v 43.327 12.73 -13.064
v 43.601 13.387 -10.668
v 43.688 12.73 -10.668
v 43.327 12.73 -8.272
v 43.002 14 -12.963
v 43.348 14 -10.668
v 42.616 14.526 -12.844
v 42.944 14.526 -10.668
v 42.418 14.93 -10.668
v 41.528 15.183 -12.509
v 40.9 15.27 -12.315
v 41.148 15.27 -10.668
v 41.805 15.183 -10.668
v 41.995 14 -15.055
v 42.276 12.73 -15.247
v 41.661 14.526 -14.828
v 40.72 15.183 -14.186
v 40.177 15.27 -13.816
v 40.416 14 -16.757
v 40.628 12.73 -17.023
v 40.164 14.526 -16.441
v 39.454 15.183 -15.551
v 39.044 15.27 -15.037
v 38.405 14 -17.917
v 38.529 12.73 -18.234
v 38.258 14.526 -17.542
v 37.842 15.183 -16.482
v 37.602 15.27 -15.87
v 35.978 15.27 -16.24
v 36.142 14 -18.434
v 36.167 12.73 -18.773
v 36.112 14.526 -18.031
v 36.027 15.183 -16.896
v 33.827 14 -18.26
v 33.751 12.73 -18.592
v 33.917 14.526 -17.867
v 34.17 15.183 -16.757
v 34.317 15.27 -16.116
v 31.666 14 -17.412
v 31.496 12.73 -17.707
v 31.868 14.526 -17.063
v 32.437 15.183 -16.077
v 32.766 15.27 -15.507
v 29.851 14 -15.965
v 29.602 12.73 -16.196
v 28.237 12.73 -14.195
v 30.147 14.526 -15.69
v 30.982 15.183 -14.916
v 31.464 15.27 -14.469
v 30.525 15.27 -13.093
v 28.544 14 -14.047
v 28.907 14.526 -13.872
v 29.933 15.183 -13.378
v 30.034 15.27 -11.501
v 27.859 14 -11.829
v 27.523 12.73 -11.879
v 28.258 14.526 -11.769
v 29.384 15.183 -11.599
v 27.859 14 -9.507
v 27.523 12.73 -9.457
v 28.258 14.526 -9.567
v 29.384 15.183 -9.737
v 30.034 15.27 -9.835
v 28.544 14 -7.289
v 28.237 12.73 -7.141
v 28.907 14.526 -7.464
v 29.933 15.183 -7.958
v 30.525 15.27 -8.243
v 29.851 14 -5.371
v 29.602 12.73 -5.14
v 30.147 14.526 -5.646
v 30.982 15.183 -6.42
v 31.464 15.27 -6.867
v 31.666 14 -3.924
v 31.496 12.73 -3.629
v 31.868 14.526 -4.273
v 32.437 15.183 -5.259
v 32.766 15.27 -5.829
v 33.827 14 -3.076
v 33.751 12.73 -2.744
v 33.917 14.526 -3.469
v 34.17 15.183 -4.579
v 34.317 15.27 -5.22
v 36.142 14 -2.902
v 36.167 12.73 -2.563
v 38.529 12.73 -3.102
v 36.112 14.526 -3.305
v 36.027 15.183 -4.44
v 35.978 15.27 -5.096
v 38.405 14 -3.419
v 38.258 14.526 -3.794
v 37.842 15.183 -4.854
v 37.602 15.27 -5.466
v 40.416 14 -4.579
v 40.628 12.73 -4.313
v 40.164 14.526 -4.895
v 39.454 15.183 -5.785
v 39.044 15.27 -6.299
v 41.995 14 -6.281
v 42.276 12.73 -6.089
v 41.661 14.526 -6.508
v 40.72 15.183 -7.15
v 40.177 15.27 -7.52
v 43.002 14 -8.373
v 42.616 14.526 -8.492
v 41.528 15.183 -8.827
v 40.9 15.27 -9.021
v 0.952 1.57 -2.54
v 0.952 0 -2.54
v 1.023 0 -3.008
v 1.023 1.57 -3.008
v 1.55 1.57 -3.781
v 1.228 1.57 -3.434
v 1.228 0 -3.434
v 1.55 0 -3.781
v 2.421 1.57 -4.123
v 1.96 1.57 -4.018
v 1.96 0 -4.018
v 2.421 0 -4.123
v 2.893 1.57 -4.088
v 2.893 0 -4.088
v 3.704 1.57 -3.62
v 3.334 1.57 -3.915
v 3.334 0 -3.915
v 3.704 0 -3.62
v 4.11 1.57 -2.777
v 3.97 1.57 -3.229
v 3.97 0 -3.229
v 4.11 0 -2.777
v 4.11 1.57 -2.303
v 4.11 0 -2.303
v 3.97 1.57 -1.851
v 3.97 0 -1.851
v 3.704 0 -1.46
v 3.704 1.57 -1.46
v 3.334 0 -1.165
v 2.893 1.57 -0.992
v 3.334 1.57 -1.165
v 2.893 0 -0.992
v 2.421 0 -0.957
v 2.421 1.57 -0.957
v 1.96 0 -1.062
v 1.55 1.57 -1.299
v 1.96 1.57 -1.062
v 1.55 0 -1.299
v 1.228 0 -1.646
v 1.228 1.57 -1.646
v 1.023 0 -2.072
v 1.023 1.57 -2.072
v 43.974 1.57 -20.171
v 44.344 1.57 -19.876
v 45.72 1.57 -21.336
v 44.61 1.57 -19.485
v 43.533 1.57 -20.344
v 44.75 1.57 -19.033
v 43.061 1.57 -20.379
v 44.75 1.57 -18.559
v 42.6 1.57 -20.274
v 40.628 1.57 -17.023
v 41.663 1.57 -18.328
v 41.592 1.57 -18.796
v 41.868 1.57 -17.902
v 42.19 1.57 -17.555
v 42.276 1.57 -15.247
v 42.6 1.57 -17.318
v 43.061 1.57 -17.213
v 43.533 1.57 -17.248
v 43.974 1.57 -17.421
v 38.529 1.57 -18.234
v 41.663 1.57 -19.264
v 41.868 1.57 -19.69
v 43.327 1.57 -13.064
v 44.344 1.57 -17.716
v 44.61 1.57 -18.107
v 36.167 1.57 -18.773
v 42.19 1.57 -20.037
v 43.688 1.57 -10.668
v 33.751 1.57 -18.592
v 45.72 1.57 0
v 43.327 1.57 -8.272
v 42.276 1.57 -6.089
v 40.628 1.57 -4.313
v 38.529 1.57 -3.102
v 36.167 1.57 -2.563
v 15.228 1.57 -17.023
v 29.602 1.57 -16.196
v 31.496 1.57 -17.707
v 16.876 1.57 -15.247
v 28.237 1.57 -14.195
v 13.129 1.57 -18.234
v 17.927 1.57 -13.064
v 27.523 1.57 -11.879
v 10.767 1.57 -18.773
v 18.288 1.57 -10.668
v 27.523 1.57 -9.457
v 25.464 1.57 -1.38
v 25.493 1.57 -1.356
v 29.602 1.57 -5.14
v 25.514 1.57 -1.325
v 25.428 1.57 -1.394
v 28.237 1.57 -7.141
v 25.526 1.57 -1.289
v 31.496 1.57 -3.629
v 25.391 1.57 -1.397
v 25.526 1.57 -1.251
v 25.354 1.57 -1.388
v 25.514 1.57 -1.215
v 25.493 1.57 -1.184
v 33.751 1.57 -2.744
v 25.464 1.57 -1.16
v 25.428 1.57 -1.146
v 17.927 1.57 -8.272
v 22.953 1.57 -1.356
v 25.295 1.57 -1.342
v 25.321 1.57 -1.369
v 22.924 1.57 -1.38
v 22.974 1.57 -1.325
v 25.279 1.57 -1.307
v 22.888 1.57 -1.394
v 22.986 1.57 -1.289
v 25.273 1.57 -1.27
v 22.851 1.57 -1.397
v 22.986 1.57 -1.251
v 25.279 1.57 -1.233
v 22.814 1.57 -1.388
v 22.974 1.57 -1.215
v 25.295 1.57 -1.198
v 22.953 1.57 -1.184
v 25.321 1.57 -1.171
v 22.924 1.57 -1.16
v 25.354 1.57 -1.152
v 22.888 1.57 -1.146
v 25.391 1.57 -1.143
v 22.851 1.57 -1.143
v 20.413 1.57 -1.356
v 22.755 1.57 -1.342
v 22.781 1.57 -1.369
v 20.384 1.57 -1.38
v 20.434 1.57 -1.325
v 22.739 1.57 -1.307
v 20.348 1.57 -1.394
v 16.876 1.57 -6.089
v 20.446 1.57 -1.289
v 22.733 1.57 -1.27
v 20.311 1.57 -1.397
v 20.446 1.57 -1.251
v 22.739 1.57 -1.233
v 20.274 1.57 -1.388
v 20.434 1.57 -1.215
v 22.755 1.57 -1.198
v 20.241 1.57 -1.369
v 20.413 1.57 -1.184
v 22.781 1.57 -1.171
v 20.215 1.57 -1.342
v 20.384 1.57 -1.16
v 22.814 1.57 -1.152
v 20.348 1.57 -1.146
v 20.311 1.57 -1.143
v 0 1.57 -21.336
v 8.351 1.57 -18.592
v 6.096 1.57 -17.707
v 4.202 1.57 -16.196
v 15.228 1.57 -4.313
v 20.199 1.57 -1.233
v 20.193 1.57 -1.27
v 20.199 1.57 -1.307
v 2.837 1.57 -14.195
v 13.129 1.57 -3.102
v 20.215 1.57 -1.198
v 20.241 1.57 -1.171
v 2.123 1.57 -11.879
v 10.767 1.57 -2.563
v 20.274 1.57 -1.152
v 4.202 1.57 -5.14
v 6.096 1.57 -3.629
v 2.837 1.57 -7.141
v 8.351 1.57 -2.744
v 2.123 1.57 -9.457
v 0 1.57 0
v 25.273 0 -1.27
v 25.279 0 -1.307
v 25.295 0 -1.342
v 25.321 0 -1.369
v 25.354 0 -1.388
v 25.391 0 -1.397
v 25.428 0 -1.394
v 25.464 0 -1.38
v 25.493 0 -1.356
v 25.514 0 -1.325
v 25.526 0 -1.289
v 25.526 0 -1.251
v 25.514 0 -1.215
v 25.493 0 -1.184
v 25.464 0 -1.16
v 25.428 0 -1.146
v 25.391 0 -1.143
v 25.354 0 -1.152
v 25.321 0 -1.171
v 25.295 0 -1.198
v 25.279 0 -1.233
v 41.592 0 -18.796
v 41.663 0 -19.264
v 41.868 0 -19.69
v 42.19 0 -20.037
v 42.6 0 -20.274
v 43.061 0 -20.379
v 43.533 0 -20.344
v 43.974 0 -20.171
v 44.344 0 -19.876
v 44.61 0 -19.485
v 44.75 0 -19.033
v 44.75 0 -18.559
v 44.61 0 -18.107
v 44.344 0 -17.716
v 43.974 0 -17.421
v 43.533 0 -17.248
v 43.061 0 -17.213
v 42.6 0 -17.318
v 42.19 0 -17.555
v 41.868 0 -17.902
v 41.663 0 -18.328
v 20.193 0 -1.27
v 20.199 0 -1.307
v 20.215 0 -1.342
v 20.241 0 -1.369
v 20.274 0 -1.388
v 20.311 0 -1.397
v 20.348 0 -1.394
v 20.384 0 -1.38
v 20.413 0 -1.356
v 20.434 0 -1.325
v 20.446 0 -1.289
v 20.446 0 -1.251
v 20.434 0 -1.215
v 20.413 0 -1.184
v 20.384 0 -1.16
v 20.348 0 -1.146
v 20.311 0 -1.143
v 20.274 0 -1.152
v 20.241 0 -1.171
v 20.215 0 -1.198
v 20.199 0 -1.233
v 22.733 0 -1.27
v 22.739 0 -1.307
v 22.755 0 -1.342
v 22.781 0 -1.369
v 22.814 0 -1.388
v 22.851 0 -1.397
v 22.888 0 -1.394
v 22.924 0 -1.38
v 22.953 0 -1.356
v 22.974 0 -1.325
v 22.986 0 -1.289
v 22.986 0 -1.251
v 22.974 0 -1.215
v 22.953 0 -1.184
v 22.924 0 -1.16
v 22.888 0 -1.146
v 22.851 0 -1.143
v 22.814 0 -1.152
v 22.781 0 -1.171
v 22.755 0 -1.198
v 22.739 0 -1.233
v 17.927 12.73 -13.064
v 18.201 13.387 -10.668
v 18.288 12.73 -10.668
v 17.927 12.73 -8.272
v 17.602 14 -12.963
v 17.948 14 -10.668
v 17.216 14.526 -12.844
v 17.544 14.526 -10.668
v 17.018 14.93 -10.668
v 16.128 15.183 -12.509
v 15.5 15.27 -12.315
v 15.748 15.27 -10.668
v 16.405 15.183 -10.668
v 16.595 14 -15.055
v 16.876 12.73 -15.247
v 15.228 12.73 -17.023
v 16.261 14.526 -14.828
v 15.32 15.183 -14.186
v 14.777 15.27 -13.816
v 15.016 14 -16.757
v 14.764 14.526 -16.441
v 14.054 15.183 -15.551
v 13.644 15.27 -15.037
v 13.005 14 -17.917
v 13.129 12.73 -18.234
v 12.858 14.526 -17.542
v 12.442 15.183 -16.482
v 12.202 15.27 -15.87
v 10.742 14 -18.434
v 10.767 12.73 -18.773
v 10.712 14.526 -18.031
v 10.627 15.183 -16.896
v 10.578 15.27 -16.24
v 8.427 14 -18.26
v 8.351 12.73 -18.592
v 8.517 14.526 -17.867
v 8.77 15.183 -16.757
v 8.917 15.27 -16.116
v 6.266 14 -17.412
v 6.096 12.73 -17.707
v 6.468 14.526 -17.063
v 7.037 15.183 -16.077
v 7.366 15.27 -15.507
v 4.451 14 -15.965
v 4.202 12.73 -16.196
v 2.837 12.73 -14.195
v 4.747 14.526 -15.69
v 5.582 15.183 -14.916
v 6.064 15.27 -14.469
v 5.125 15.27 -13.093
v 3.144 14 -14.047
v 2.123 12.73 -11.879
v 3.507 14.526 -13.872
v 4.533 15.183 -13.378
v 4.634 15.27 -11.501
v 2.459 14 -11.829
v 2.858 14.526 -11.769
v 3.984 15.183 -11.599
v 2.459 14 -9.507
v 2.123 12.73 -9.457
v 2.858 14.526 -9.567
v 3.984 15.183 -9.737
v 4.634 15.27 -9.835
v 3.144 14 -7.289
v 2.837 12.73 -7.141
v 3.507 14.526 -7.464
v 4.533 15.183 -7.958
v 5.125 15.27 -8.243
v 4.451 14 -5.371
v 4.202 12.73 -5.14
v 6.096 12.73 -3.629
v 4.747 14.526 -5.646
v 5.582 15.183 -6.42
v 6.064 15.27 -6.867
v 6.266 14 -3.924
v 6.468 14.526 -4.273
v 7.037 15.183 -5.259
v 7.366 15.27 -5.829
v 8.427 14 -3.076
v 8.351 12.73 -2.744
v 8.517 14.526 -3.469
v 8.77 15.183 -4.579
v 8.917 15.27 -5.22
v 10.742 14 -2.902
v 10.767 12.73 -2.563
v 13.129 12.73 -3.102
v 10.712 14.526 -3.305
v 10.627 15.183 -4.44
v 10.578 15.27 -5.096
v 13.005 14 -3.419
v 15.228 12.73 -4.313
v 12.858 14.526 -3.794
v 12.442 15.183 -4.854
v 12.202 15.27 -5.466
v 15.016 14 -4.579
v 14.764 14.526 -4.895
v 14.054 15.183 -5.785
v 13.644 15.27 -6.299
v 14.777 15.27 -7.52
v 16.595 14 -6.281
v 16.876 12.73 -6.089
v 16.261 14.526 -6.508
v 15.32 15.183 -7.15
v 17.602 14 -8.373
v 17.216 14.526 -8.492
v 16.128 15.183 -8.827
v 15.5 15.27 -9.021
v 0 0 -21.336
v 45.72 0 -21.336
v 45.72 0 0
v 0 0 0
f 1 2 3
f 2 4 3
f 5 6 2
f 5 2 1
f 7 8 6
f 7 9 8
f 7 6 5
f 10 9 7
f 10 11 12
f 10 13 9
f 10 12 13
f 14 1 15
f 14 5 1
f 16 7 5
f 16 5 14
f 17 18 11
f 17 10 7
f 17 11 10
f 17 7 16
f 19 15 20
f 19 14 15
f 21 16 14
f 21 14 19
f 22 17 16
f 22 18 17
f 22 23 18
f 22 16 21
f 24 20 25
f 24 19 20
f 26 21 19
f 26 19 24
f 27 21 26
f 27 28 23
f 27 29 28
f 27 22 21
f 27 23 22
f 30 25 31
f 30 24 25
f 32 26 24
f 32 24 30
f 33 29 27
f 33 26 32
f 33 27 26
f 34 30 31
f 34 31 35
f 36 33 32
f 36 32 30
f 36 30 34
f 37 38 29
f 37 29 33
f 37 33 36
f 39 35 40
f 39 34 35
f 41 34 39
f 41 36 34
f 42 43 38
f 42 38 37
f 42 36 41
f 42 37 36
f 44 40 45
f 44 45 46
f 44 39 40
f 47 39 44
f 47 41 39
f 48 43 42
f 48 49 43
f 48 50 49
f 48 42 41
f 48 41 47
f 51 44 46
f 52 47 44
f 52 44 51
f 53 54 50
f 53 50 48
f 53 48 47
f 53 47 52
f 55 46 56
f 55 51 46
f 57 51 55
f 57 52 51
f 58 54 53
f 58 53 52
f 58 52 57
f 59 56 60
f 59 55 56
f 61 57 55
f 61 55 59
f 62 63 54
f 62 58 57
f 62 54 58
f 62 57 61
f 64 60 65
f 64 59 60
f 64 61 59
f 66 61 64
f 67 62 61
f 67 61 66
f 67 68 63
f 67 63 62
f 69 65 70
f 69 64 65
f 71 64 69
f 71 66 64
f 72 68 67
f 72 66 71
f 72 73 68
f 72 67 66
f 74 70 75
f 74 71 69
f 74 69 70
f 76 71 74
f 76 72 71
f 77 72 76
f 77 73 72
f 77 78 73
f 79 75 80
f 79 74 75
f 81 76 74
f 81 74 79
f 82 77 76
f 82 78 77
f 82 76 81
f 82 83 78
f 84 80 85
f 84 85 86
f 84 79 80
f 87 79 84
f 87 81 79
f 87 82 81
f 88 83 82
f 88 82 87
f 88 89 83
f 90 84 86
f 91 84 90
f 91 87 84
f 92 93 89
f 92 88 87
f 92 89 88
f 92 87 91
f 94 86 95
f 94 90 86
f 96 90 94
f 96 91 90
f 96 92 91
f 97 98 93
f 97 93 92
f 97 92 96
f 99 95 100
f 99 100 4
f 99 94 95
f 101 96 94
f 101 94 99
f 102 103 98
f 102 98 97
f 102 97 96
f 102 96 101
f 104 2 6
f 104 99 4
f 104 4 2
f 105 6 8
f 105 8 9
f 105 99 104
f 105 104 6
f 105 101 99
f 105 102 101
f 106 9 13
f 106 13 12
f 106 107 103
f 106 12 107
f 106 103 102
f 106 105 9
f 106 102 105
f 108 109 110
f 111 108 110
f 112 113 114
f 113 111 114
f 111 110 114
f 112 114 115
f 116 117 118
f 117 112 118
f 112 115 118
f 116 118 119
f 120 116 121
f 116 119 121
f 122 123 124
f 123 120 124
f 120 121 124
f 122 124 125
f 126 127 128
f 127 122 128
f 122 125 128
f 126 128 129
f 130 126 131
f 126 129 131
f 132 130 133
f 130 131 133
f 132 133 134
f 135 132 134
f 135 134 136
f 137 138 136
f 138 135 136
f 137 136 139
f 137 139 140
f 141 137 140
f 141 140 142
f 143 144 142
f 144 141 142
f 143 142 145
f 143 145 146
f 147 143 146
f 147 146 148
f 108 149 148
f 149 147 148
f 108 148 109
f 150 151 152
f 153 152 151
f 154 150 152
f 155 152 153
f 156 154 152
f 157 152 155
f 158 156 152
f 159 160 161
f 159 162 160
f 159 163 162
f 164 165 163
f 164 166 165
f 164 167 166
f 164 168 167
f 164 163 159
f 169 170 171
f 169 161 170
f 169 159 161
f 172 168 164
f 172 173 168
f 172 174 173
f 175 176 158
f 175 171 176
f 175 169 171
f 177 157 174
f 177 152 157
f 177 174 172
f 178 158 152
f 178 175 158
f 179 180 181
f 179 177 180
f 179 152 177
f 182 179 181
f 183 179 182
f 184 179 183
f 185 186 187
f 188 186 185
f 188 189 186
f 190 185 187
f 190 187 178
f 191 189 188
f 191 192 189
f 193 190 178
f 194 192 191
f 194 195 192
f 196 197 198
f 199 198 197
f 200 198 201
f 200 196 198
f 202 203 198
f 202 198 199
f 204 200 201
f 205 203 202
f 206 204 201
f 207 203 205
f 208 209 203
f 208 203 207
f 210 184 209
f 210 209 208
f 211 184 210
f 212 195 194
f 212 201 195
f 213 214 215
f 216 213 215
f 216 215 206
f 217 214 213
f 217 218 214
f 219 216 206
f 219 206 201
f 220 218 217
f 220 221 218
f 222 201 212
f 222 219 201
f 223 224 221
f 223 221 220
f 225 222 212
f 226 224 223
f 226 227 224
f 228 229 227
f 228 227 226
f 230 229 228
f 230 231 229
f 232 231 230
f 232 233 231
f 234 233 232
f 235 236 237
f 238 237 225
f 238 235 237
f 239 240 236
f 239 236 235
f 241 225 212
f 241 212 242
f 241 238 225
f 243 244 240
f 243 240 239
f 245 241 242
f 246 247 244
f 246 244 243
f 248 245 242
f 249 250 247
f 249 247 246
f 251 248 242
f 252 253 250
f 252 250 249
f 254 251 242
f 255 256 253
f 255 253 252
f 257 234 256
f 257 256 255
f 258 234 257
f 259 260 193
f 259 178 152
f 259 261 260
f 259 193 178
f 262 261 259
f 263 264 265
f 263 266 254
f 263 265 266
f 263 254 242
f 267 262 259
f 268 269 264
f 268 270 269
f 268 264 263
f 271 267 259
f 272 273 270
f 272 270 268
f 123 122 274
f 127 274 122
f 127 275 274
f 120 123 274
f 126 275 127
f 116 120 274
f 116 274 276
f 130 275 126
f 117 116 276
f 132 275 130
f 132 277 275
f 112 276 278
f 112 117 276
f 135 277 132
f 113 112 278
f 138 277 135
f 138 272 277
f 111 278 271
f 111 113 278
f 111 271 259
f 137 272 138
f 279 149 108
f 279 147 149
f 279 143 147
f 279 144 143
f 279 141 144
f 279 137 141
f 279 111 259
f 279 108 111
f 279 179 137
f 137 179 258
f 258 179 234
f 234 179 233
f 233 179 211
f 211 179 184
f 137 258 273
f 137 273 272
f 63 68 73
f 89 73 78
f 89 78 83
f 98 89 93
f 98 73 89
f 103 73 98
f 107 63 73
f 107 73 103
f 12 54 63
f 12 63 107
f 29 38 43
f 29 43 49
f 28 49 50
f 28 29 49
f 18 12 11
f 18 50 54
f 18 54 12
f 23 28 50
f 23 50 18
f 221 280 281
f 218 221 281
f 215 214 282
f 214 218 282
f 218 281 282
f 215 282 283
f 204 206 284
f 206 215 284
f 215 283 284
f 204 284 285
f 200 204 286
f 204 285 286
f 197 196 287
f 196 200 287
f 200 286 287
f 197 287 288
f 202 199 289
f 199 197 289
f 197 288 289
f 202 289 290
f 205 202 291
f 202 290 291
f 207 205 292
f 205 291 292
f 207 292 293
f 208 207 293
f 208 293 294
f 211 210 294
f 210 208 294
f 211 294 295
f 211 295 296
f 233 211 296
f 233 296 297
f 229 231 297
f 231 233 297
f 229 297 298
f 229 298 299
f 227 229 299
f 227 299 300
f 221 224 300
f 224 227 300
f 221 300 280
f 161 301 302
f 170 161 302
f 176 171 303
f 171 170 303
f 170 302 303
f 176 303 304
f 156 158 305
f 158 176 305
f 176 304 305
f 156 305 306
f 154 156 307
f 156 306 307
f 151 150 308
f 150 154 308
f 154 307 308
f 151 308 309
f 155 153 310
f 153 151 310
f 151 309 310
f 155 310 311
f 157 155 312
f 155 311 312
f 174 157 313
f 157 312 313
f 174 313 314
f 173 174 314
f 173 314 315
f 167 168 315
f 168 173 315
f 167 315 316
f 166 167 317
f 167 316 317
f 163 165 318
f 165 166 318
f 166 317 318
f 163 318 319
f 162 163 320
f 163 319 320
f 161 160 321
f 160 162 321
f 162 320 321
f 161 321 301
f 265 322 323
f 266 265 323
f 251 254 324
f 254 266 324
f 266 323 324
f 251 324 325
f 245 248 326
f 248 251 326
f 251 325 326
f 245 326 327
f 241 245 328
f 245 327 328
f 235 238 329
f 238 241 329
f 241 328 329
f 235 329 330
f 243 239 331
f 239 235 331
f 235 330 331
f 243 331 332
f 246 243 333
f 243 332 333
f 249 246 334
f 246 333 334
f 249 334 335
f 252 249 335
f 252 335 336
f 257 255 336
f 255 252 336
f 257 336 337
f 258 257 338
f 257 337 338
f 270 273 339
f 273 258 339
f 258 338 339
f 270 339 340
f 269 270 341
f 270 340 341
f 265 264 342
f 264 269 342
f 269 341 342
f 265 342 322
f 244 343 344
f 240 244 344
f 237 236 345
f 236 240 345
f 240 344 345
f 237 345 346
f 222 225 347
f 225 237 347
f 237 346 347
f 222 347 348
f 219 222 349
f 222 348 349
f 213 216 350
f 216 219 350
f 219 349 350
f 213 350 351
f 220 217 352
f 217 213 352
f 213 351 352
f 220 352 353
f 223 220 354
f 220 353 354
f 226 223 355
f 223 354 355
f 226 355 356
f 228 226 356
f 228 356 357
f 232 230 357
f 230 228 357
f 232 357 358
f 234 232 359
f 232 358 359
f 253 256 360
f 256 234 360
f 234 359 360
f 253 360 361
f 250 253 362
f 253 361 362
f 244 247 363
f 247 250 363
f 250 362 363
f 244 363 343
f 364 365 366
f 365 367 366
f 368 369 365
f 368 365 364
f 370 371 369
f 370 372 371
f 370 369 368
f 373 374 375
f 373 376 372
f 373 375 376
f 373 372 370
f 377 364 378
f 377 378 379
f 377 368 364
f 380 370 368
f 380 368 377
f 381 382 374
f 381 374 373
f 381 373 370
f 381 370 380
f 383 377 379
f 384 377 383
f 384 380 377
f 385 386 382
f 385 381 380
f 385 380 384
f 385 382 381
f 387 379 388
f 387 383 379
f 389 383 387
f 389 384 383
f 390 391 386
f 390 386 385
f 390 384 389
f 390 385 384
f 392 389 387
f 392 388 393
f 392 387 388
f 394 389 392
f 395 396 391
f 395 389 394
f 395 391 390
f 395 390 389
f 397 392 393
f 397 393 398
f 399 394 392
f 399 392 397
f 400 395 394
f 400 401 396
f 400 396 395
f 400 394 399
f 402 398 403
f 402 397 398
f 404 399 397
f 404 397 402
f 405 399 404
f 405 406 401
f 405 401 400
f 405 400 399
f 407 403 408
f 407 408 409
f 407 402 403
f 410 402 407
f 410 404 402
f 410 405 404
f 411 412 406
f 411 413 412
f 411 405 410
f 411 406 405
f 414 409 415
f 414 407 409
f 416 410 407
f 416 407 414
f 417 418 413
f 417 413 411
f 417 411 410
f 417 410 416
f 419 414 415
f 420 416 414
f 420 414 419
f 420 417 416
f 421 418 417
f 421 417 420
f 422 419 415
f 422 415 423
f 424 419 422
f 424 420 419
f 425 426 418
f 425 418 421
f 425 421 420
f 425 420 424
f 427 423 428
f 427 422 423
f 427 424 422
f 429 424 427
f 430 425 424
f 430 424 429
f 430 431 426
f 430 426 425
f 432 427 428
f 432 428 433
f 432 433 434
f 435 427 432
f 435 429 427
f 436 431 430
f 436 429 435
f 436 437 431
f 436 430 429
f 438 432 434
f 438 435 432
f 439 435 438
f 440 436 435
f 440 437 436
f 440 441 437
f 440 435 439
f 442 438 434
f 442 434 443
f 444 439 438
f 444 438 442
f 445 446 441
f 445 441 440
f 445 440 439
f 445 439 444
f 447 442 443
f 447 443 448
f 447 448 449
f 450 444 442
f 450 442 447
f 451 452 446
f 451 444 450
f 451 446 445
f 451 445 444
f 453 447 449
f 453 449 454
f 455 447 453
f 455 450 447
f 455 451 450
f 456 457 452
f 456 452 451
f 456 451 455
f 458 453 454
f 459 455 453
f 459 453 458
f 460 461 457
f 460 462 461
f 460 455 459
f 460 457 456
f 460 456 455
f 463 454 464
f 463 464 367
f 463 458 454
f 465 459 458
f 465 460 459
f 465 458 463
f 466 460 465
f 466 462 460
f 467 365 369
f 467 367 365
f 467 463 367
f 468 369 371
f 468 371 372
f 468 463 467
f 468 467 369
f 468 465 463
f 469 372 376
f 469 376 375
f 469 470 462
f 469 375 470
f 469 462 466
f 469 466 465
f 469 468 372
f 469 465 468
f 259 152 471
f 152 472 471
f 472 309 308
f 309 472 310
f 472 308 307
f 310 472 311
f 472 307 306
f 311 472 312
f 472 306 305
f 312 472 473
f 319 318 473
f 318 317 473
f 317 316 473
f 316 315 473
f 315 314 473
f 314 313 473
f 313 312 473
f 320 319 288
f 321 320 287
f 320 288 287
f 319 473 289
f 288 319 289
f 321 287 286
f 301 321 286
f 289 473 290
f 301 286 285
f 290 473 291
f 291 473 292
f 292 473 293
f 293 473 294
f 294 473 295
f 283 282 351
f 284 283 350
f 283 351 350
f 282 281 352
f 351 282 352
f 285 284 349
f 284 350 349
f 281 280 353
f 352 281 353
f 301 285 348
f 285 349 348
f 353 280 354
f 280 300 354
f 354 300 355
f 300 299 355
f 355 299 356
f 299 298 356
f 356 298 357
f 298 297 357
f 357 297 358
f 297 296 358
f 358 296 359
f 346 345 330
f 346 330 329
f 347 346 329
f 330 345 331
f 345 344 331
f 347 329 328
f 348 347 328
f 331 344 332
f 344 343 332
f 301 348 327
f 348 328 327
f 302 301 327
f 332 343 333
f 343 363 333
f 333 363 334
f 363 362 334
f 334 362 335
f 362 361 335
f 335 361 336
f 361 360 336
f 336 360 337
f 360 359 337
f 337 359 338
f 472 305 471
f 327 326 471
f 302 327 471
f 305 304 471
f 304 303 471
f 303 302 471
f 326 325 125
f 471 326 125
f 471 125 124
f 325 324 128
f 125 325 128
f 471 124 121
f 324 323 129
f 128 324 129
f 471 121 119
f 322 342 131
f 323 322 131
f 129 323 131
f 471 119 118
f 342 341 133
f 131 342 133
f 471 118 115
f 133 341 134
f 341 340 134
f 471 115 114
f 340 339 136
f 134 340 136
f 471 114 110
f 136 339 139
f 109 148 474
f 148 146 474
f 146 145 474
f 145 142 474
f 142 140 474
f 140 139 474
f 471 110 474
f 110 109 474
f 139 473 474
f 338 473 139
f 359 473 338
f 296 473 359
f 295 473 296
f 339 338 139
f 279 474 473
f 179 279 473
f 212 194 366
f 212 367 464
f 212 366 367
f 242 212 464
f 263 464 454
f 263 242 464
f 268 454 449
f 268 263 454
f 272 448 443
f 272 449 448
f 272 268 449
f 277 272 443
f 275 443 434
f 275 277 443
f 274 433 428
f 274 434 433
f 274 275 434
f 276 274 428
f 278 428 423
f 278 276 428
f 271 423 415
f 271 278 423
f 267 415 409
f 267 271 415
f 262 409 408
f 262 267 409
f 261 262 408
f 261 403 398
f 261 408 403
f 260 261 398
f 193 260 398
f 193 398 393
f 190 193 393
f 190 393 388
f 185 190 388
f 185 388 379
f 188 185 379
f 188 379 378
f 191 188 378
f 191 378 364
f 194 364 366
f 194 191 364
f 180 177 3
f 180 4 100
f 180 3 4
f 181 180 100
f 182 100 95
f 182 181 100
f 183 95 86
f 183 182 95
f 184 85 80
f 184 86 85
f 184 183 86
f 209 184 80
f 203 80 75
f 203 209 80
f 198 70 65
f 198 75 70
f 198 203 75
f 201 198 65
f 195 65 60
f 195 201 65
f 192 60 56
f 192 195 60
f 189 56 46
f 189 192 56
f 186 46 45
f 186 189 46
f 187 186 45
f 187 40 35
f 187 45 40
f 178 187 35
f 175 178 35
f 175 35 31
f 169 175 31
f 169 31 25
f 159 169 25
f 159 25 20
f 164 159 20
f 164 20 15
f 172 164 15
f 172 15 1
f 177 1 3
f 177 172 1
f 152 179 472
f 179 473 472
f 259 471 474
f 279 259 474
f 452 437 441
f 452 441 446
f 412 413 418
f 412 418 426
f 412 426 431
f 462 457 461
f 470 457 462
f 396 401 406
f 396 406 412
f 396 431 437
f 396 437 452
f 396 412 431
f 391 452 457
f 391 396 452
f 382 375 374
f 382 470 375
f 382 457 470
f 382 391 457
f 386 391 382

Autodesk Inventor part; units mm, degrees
ref_plane "YZ Plane" through (0, 0, 0) normal (1, 0, 0) x (0, 1, 0)
ref_plane "XZ Plane" through (0, 0, 0) normal (0, 1, 0) x (-1, 0, 0)
ref_plane "XY Plane" through (0, 0, 0) normal (0, 0, 1) x (1, 0, 0)
sketch "Sketch1" plane through (0, 0, 0) normal (0, 1, 0) x (-1, 0, 0)
  line L0 (0, 0) -> (-45.72, 0)
  line L1 (-45.72, 0) -> (-45.72, -21.336)
  line L2 (-45.72, -21.336) -> (0, -21.336)
  line L3 (0, -21.336) -> (0, 0)
  circle A0 centre (-2.54, -2.54) radius 1.5875
  circle A1 centre (-43.18, -18.796) radius 1.5875
  line L4 (-22.86, -21.336) -> (-22.86, 0) construction
  circle A2 centre (-22.86, -1.27) radius 0.127
  circle A3 centre (-20.32, -1.27) radius 0.127
  circle A4 centre (-25.4, -1.27) radius 0.127
  dimension "d0" = 21.336
  dimension "d1" = 45.72
  dimension "d2" = 3.175
  dimension "d3" = 2.54
  dimension "d4" = 2.54
  dimension "d5" = 3.175
  dimension "d6" = 2.54
  dimension "d7" = 2.54
  dimension "d9" = 0.254
  dimension "d10" = 0.254
  dimension "d11" = 0.254
  dimension "d12" = 2.54
  dimension "d13" = 2.54
  dimension "d14" = 1.27
extrude "Extrusion1" add sketch "Sketch1" along normal blind 1.57
sketch "Sketch2" plane through (0, 1.57, 0) normal (0, 1, 0) x (1, 0, 0)
  circle A0 centre (10.16, 10.668) radius 8.128
  line L0 (45.72, 21.336) -> (0, 21.336) projected
  line L1 (22.86, 21.336) -> (22.86, 0) construction
  line L2 (0, 0) -> (45.72, 0) projected
  line L3 (0, 21.336) -> (0, 0) projected
  circle A1 centre (35.56, 10.668) radius 8.128
  dimension "d17" = 10.16
  dimension "d18" = 16.256
  dimension "d19" = 10.668
extrude "Extrusion2" add sketch "Sketch2" along normal blind 13.7
fillet "Fillet1" radius 2.54 1 edges at (2.032, 15.27, -10.668)
fillet "Fillet2" radius 2.54 1 edges at (27.432, 15.27, -10.668)
properties part number "ping"
